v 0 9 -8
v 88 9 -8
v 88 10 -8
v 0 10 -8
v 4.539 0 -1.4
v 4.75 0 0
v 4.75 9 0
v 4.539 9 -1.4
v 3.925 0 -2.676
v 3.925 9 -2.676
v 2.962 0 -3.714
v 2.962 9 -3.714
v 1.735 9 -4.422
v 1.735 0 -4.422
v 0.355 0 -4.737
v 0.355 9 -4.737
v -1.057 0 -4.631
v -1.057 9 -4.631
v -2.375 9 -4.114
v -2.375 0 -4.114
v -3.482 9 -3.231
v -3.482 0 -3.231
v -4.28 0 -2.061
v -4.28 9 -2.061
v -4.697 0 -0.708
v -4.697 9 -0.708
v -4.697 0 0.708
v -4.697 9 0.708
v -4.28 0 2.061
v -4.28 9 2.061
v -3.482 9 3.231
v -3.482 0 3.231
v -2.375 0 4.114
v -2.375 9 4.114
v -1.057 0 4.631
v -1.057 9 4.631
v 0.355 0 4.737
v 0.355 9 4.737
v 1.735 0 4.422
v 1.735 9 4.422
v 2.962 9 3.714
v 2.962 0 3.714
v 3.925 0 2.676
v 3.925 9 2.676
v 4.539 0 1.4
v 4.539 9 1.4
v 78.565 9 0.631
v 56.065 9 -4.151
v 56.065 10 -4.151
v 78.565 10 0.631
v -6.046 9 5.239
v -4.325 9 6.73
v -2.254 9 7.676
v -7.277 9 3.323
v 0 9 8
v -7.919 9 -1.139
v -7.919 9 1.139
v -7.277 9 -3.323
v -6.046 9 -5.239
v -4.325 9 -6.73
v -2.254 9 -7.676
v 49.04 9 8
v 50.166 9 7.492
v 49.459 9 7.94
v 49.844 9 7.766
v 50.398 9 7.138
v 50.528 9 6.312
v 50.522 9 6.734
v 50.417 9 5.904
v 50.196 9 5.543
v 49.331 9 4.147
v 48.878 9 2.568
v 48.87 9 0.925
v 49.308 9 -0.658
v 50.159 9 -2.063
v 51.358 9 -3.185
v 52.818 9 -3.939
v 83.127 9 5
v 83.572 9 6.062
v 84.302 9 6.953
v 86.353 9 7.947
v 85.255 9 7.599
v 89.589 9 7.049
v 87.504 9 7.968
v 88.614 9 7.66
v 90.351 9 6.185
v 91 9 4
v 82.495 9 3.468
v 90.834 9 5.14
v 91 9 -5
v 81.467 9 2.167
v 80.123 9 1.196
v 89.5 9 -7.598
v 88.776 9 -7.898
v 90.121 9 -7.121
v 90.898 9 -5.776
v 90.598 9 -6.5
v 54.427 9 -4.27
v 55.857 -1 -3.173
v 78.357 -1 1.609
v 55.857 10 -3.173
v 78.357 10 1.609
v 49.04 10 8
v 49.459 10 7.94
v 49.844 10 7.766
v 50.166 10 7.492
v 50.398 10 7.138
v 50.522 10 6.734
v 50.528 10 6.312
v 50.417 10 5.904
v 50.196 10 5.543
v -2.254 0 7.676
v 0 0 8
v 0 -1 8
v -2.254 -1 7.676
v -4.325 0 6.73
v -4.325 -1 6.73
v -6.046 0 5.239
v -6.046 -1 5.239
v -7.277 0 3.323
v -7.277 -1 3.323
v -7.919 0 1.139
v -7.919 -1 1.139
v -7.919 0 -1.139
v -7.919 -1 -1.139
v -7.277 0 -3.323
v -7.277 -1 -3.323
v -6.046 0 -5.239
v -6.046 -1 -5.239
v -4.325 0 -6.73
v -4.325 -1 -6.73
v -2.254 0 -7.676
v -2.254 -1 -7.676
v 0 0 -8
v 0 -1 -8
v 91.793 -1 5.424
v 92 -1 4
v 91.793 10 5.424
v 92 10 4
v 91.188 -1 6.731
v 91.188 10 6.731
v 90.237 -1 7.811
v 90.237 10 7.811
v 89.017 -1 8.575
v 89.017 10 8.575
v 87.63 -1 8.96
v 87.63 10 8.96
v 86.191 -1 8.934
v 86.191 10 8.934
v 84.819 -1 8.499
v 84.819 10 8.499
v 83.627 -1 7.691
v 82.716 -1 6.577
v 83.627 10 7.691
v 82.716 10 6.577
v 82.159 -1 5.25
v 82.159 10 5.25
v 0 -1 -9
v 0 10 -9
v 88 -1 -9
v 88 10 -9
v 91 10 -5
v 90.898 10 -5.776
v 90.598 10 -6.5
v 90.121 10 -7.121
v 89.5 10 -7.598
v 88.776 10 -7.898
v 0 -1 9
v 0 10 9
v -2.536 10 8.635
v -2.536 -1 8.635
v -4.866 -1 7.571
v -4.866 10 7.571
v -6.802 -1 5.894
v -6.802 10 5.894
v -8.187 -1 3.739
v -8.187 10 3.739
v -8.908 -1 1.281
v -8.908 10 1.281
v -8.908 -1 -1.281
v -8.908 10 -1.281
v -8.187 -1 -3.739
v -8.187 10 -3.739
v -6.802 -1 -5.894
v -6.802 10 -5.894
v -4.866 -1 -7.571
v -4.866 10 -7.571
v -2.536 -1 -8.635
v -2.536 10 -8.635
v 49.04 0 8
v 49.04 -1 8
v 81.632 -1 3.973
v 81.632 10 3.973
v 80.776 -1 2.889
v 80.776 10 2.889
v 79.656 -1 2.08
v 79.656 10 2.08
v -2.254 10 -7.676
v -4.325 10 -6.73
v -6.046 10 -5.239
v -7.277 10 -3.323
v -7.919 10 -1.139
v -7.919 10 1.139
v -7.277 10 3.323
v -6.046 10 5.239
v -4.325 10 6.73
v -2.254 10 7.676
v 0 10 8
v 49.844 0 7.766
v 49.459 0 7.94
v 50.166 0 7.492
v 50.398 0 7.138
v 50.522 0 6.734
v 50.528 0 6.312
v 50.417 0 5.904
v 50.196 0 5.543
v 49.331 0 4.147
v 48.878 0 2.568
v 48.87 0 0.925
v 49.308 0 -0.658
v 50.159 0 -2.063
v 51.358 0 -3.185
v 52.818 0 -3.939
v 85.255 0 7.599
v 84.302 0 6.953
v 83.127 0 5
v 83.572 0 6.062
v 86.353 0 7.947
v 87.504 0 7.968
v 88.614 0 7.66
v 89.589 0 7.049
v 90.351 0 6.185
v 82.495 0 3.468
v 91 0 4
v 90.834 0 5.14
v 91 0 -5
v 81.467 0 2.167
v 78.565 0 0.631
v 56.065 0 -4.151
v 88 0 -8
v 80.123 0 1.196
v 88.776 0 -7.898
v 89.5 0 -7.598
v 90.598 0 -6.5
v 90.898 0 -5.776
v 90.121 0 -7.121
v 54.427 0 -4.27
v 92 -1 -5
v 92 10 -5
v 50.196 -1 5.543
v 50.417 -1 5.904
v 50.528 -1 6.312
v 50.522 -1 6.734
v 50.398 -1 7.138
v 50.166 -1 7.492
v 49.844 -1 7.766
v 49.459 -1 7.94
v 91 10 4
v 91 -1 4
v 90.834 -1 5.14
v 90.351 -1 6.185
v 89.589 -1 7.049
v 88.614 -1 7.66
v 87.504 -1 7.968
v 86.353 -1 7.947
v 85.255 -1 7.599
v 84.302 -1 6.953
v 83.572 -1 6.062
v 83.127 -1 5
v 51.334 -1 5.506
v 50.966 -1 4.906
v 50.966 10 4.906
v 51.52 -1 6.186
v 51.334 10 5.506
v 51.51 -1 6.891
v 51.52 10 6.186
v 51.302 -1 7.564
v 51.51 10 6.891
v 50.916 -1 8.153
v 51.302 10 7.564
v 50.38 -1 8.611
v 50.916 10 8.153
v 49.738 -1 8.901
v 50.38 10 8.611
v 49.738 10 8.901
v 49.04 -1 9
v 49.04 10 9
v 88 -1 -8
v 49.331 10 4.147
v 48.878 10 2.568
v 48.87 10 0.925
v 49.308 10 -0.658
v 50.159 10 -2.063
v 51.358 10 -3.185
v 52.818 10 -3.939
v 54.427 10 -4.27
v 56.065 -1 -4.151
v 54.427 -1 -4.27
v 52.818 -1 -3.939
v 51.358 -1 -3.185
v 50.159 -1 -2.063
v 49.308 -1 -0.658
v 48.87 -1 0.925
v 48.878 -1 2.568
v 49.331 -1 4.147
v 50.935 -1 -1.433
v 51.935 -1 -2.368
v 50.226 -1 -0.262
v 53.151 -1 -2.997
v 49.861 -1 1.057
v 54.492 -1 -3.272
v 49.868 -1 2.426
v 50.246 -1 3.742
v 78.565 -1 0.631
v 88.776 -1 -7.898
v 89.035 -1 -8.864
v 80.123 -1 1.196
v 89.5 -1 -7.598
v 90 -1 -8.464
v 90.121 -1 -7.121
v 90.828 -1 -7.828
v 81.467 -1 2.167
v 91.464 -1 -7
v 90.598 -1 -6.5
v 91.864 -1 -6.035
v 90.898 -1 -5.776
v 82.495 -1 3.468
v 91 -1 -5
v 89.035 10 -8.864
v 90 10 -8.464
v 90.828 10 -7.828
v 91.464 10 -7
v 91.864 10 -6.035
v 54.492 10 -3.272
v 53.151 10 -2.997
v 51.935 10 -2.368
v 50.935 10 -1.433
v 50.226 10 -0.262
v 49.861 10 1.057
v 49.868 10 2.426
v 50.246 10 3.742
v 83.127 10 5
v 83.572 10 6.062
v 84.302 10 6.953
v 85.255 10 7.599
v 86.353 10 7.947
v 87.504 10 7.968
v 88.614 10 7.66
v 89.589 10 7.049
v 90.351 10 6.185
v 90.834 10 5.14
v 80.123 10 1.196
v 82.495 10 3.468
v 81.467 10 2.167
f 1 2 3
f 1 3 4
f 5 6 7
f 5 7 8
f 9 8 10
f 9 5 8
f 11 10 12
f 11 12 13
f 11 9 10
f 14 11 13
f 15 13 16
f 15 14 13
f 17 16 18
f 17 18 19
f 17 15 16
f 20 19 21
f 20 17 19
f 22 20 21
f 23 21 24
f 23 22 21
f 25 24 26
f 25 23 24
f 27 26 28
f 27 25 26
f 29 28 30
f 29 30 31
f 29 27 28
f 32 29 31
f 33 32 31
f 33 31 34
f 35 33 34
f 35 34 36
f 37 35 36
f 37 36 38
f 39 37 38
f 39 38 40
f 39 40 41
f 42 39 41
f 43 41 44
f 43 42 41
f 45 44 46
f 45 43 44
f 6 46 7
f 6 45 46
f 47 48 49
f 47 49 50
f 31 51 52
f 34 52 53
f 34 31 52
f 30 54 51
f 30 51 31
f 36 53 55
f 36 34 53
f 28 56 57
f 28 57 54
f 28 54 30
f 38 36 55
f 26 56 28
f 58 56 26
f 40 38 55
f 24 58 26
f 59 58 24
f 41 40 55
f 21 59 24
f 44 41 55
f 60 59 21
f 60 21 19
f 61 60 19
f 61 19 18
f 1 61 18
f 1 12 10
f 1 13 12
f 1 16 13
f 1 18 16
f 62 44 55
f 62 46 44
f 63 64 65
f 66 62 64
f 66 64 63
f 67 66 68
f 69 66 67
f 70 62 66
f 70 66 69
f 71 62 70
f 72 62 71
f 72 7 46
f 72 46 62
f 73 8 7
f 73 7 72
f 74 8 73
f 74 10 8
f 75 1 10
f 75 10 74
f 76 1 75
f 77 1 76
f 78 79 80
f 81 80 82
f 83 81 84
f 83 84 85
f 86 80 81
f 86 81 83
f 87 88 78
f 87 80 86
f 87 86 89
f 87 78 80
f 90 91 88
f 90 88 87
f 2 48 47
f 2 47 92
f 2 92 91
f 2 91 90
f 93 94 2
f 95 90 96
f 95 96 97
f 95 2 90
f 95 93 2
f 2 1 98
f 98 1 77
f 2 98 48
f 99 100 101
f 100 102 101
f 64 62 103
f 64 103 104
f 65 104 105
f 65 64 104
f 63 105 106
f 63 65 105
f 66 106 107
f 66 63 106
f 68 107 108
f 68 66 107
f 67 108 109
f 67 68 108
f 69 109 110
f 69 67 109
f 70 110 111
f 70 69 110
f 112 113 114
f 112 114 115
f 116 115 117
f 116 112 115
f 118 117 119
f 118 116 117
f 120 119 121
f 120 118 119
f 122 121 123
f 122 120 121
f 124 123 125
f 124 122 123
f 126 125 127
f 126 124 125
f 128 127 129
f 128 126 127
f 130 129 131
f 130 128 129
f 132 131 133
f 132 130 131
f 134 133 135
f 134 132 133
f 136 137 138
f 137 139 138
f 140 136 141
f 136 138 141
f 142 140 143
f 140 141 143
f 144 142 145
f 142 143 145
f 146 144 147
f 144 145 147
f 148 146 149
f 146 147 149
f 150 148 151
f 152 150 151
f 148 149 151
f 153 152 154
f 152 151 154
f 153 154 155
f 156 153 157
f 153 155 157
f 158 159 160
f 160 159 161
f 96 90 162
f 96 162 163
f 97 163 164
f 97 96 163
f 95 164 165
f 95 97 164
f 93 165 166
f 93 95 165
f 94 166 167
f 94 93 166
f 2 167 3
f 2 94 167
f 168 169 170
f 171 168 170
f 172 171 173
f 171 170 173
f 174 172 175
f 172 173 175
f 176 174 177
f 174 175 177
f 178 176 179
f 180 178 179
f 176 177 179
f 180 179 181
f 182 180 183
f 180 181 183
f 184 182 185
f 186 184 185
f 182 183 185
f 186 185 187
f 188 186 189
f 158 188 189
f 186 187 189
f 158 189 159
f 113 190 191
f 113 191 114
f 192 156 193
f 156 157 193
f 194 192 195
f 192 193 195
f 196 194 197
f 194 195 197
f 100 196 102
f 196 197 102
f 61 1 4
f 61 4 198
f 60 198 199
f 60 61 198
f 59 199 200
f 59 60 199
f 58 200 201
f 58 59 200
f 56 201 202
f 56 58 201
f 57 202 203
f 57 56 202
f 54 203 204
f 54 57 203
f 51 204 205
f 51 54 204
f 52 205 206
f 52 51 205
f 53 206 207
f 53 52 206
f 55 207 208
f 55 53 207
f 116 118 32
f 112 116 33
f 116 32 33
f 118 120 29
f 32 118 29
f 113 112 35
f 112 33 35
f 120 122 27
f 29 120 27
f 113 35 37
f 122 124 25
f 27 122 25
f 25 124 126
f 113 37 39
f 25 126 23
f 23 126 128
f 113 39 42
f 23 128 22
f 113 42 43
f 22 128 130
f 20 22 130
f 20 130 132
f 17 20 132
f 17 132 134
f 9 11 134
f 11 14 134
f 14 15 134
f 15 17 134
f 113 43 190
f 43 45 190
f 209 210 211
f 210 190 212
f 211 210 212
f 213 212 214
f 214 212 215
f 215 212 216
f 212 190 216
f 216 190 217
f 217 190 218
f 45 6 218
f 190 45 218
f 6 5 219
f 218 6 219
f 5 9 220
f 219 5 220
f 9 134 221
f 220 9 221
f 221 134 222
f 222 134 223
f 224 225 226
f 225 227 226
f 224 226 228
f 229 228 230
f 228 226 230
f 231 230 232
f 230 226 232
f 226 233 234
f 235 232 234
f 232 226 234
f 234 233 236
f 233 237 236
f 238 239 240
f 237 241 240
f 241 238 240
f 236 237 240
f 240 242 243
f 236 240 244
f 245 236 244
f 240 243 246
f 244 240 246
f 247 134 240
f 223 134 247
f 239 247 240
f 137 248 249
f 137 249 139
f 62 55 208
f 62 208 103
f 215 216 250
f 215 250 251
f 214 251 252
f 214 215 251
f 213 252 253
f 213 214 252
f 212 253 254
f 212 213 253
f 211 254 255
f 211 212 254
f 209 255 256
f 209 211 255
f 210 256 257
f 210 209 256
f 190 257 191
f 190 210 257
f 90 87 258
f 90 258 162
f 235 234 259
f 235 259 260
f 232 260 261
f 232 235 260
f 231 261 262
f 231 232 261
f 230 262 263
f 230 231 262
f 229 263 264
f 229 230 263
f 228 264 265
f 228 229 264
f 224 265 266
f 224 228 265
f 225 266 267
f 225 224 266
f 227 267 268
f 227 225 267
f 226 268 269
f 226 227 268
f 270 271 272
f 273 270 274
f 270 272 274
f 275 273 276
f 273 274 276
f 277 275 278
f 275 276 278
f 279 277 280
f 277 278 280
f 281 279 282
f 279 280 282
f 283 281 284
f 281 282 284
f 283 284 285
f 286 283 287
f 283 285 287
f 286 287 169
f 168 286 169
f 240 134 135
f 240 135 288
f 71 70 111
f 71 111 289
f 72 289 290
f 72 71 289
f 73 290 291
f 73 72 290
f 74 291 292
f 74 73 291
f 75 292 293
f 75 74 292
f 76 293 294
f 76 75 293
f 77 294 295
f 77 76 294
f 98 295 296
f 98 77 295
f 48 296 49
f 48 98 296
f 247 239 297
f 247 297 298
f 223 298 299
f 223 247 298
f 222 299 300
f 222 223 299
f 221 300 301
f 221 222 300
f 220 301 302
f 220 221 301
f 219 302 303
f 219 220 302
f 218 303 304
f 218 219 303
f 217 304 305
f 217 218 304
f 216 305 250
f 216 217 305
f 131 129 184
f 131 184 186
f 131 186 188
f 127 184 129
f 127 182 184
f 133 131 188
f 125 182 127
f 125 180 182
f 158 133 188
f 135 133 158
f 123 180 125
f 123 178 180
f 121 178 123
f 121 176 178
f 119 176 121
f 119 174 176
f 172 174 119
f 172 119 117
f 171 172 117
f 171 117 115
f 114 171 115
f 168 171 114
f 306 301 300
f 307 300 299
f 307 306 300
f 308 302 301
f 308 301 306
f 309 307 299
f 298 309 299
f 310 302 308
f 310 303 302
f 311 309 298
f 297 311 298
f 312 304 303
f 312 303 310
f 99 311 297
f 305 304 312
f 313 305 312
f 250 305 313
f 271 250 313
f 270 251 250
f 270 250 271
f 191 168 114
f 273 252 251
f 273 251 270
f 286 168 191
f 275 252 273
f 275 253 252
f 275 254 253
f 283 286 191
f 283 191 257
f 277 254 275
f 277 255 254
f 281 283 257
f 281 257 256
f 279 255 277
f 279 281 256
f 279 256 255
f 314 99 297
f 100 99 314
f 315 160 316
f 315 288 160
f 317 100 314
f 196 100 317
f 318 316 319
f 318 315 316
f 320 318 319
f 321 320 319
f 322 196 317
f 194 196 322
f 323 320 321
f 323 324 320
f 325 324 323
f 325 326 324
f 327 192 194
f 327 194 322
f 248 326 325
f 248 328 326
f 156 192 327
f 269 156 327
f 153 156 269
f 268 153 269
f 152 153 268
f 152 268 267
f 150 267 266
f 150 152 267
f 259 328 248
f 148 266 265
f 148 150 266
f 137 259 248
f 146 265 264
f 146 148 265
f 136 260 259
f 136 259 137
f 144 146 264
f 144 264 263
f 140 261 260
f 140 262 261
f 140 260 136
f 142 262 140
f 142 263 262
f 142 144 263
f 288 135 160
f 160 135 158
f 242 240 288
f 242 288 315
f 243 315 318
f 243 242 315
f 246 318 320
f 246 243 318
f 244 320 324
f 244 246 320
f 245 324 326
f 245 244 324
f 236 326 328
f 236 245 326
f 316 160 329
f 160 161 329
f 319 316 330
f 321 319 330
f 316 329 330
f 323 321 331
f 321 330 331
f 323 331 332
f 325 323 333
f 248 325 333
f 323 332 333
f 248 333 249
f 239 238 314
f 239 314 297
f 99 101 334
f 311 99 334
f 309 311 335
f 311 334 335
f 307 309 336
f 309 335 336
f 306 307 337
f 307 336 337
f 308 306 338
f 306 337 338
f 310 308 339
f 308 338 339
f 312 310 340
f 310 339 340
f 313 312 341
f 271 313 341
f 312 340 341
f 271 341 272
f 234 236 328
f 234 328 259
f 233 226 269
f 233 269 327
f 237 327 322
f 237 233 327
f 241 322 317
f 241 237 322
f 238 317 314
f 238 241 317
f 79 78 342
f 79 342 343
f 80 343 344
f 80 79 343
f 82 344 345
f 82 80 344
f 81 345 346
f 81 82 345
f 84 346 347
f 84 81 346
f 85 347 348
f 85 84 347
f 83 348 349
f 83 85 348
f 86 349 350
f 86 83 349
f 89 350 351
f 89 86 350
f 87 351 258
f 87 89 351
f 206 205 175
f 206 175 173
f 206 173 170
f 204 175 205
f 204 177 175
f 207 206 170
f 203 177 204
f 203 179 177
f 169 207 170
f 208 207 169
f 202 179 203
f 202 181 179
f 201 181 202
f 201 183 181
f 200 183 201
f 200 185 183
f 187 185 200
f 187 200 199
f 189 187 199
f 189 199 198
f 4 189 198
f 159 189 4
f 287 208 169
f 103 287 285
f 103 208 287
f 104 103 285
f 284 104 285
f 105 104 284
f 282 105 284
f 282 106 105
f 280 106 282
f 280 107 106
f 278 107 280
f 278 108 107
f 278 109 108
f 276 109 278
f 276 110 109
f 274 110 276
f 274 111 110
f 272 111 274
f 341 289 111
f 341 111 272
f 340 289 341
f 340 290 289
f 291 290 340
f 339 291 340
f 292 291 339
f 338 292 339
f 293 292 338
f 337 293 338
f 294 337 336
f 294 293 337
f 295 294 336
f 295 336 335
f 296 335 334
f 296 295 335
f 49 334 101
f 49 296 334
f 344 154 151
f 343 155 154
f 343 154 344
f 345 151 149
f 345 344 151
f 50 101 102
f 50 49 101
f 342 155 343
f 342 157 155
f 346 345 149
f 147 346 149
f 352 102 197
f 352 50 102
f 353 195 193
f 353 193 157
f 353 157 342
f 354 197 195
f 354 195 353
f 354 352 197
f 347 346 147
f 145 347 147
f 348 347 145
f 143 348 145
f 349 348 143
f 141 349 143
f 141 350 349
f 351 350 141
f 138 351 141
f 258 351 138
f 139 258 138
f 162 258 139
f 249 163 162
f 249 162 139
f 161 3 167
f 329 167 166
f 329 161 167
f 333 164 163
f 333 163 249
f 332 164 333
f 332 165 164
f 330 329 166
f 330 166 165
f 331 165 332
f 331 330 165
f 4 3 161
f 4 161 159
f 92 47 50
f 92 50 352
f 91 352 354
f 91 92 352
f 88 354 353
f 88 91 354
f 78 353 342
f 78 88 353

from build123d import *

# Parameters (mm, degrees)
SKETCH1_R           = 4.75
BOSS_EXTRUDE1_DEPTH = 9
BOSS_EXTRUDE2_DEPTH = 1
BOSS_EXTRUDE3_DEPTH = 1


with BuildPart() as part:
    # Sketch1 → Boss-Extrude1 (new body)
    with BuildSketch(Plane(origin=(0, 0, 0), x_dir=(1, 0, 0), z_dir=(0, 1, 0))):
        with BuildLine():
            Line((55.857100089, 3.173260641), (78.357100089, -1.609261996))
            ThreePointArc((78.357100089, -1.609261996), (80.775815642, -2.888858783), (82.158770817, -5.25))
            ThreePointArc((82.158770817, -5.25), (87.630021462, -8.960148481), (92, -4))
            Line((92, -4), (92, 5))
            ThreePointArc((92, 5), (90.828427125, 7.828427125), (88, 9))
            Line((88, 9), (0, 9))
            ThreePointArc((0, 9), (-9, 0), (0, -9))
            Line((0, -9), (49.040217235, -9))
            ThreePointArc((49.040217235, -9), (51.302454571, -7.564087513), (50.965992035, -4.905825787))
            ThreePointArc((50.965992035, -4.905825787), (50.540307373, 0.871975682), (55.857100089, 3.173260641))
        make_face()
        Circle(SKETCH1_R, mode=Mode.SUBTRACT)
    extrude(amount=BOSS_EXTRUDE1_DEPTH)

    # Sketch2 → Boss-Extrude2 (add)
    with BuildSketch(Plane(origin=(0, 9, 0), x_dir=(1, 0, 0), z_dir=(0, 1, 0))):
        with BuildLine():
            Line((0, -9), (49.040217235, -9))
            ThreePointArc((49.040217235, -9), (51.302454571, -7.564087513), (50.965992035, -4.905825787))
            ThreePointArc((50.965992035, -4.905825787), (50.540307373, 0.871975682), (55.857100089, 3.173260641))
            Line((55.857100089, 3.173260641), (78.357100089, -1.609261996))
            ThreePointArc((78.357100089, -1.609261996), (80.775815642, -2.888858783), (82.158770817, -5.25))
            ThreePointArc((82.158770817, -5.25), (87.630021462, -8.960148481), (92, -4))
            Line((92, -4), (92, 5))
            ThreePointArc((92, 5), (90.828427125, 7.828427125), (88, 9))
            Line((88, 9), (0, 9))
            ThreePointArc((0, 9), (-9, 0), (0, -9))
        make_face()
        with BuildLine():
            Line((88, 8), (0, 8))
            ThreePointArc((0, 8), (-8, 0), (0, -8))
            Line((0, -8), (49.040217235, -8))
            ThreePointArc((49.040217235, -8), (50.397559636, -7.138452508), (50.195682115, -5.543495472))
            ThreePointArc((50.195682115, -5.543495472), (49.68486052, 1.389866291), (56.065011779, 4.151408242))
            Line((56.065011779, 4.151408242), (78.565011779, -0.631114396))
            ThreePointArc((78.565011779, -0.631114396), (81.467470443, -2.166630539), (83.127016654, -5))
            ThreePointArc((83.127016654, -5), (87.50401717, -7.968118785), (91, -4))
            Line((91, -4), (91, 5))
            ThreePointArc((91, 5), (90.121320344, 7.121320344), (88, 8))
        make_face(mode=Mode.SUBTRACT)
    extrude(amount=BOSS_EXTRUDE2_DEPTH)

    # Sketch3 → Boss-Extrude3 (add)
    with BuildSketch(Plane.XZ):
        with BuildLine():
            Line((0, -9), (88, -9))
            ThreePointArc((88, -9), (90.828427125, -7.828427125), (92, -5))
            Line((92, -5), (92, 4))
            ThreePointArc((92, 4), (87.630021462, 8.960148481), (82.158770817, 5.25))
            ThreePointArc((82.158770817, 5.25), (80.775815642, 2.888858783), (78.357100089, 1.609261996))
            Line((78.357100089, 1.609261996), (55.857100089, -3.173260641))
            ThreePointArc((55.857100089, -3.173260641), (50.540307373, -0.871975682), (50.965992035, 4.905825787))
            ThreePointArc((50.965992035, 4.905825787), (51.302454571, 7.564087513), (49.040217235, 9))
            Line((49.040217235, 9), (0, 9))
            ThreePointArc((0, 9), (-9, 0), (0, -9))
        make_face()
        with BuildLine():
            Line((49.040217235, 8), (0, 8))
            ThreePointArc((0, 8), (-8, 0), (0, -8))
            Line((0, -8), (88, -8))
            ThreePointArc((88, -8), (90.121320344, -7.121320344), (91, -5))
            Line((91, -5), (91, 4))
            ThreePointArc((91, 4), (87.50401717, 7.968118785), (83.127016654, 5))
            ThreePointArc((83.127016654, 5), (81.467470443, 2.166630539), (78.565011779, 0.631114396))
            Line((78.565011779, 0.631114396), (56.065011779, -4.151408242))
            ThreePointArc((56.065011779, -4.151408242), (49.68486052, -1.389866291), (50.195682115, 5.543495472))
            ThreePointArc((50.195682115, 5.543495472), (50.397559636, 7.138452508), (49.040217235, 8))
        make_face(mode=Mode.SUBTRACT)
    extrude(amount=BOSS_EXTRUDE3_DEPTH)


solid = part.part
